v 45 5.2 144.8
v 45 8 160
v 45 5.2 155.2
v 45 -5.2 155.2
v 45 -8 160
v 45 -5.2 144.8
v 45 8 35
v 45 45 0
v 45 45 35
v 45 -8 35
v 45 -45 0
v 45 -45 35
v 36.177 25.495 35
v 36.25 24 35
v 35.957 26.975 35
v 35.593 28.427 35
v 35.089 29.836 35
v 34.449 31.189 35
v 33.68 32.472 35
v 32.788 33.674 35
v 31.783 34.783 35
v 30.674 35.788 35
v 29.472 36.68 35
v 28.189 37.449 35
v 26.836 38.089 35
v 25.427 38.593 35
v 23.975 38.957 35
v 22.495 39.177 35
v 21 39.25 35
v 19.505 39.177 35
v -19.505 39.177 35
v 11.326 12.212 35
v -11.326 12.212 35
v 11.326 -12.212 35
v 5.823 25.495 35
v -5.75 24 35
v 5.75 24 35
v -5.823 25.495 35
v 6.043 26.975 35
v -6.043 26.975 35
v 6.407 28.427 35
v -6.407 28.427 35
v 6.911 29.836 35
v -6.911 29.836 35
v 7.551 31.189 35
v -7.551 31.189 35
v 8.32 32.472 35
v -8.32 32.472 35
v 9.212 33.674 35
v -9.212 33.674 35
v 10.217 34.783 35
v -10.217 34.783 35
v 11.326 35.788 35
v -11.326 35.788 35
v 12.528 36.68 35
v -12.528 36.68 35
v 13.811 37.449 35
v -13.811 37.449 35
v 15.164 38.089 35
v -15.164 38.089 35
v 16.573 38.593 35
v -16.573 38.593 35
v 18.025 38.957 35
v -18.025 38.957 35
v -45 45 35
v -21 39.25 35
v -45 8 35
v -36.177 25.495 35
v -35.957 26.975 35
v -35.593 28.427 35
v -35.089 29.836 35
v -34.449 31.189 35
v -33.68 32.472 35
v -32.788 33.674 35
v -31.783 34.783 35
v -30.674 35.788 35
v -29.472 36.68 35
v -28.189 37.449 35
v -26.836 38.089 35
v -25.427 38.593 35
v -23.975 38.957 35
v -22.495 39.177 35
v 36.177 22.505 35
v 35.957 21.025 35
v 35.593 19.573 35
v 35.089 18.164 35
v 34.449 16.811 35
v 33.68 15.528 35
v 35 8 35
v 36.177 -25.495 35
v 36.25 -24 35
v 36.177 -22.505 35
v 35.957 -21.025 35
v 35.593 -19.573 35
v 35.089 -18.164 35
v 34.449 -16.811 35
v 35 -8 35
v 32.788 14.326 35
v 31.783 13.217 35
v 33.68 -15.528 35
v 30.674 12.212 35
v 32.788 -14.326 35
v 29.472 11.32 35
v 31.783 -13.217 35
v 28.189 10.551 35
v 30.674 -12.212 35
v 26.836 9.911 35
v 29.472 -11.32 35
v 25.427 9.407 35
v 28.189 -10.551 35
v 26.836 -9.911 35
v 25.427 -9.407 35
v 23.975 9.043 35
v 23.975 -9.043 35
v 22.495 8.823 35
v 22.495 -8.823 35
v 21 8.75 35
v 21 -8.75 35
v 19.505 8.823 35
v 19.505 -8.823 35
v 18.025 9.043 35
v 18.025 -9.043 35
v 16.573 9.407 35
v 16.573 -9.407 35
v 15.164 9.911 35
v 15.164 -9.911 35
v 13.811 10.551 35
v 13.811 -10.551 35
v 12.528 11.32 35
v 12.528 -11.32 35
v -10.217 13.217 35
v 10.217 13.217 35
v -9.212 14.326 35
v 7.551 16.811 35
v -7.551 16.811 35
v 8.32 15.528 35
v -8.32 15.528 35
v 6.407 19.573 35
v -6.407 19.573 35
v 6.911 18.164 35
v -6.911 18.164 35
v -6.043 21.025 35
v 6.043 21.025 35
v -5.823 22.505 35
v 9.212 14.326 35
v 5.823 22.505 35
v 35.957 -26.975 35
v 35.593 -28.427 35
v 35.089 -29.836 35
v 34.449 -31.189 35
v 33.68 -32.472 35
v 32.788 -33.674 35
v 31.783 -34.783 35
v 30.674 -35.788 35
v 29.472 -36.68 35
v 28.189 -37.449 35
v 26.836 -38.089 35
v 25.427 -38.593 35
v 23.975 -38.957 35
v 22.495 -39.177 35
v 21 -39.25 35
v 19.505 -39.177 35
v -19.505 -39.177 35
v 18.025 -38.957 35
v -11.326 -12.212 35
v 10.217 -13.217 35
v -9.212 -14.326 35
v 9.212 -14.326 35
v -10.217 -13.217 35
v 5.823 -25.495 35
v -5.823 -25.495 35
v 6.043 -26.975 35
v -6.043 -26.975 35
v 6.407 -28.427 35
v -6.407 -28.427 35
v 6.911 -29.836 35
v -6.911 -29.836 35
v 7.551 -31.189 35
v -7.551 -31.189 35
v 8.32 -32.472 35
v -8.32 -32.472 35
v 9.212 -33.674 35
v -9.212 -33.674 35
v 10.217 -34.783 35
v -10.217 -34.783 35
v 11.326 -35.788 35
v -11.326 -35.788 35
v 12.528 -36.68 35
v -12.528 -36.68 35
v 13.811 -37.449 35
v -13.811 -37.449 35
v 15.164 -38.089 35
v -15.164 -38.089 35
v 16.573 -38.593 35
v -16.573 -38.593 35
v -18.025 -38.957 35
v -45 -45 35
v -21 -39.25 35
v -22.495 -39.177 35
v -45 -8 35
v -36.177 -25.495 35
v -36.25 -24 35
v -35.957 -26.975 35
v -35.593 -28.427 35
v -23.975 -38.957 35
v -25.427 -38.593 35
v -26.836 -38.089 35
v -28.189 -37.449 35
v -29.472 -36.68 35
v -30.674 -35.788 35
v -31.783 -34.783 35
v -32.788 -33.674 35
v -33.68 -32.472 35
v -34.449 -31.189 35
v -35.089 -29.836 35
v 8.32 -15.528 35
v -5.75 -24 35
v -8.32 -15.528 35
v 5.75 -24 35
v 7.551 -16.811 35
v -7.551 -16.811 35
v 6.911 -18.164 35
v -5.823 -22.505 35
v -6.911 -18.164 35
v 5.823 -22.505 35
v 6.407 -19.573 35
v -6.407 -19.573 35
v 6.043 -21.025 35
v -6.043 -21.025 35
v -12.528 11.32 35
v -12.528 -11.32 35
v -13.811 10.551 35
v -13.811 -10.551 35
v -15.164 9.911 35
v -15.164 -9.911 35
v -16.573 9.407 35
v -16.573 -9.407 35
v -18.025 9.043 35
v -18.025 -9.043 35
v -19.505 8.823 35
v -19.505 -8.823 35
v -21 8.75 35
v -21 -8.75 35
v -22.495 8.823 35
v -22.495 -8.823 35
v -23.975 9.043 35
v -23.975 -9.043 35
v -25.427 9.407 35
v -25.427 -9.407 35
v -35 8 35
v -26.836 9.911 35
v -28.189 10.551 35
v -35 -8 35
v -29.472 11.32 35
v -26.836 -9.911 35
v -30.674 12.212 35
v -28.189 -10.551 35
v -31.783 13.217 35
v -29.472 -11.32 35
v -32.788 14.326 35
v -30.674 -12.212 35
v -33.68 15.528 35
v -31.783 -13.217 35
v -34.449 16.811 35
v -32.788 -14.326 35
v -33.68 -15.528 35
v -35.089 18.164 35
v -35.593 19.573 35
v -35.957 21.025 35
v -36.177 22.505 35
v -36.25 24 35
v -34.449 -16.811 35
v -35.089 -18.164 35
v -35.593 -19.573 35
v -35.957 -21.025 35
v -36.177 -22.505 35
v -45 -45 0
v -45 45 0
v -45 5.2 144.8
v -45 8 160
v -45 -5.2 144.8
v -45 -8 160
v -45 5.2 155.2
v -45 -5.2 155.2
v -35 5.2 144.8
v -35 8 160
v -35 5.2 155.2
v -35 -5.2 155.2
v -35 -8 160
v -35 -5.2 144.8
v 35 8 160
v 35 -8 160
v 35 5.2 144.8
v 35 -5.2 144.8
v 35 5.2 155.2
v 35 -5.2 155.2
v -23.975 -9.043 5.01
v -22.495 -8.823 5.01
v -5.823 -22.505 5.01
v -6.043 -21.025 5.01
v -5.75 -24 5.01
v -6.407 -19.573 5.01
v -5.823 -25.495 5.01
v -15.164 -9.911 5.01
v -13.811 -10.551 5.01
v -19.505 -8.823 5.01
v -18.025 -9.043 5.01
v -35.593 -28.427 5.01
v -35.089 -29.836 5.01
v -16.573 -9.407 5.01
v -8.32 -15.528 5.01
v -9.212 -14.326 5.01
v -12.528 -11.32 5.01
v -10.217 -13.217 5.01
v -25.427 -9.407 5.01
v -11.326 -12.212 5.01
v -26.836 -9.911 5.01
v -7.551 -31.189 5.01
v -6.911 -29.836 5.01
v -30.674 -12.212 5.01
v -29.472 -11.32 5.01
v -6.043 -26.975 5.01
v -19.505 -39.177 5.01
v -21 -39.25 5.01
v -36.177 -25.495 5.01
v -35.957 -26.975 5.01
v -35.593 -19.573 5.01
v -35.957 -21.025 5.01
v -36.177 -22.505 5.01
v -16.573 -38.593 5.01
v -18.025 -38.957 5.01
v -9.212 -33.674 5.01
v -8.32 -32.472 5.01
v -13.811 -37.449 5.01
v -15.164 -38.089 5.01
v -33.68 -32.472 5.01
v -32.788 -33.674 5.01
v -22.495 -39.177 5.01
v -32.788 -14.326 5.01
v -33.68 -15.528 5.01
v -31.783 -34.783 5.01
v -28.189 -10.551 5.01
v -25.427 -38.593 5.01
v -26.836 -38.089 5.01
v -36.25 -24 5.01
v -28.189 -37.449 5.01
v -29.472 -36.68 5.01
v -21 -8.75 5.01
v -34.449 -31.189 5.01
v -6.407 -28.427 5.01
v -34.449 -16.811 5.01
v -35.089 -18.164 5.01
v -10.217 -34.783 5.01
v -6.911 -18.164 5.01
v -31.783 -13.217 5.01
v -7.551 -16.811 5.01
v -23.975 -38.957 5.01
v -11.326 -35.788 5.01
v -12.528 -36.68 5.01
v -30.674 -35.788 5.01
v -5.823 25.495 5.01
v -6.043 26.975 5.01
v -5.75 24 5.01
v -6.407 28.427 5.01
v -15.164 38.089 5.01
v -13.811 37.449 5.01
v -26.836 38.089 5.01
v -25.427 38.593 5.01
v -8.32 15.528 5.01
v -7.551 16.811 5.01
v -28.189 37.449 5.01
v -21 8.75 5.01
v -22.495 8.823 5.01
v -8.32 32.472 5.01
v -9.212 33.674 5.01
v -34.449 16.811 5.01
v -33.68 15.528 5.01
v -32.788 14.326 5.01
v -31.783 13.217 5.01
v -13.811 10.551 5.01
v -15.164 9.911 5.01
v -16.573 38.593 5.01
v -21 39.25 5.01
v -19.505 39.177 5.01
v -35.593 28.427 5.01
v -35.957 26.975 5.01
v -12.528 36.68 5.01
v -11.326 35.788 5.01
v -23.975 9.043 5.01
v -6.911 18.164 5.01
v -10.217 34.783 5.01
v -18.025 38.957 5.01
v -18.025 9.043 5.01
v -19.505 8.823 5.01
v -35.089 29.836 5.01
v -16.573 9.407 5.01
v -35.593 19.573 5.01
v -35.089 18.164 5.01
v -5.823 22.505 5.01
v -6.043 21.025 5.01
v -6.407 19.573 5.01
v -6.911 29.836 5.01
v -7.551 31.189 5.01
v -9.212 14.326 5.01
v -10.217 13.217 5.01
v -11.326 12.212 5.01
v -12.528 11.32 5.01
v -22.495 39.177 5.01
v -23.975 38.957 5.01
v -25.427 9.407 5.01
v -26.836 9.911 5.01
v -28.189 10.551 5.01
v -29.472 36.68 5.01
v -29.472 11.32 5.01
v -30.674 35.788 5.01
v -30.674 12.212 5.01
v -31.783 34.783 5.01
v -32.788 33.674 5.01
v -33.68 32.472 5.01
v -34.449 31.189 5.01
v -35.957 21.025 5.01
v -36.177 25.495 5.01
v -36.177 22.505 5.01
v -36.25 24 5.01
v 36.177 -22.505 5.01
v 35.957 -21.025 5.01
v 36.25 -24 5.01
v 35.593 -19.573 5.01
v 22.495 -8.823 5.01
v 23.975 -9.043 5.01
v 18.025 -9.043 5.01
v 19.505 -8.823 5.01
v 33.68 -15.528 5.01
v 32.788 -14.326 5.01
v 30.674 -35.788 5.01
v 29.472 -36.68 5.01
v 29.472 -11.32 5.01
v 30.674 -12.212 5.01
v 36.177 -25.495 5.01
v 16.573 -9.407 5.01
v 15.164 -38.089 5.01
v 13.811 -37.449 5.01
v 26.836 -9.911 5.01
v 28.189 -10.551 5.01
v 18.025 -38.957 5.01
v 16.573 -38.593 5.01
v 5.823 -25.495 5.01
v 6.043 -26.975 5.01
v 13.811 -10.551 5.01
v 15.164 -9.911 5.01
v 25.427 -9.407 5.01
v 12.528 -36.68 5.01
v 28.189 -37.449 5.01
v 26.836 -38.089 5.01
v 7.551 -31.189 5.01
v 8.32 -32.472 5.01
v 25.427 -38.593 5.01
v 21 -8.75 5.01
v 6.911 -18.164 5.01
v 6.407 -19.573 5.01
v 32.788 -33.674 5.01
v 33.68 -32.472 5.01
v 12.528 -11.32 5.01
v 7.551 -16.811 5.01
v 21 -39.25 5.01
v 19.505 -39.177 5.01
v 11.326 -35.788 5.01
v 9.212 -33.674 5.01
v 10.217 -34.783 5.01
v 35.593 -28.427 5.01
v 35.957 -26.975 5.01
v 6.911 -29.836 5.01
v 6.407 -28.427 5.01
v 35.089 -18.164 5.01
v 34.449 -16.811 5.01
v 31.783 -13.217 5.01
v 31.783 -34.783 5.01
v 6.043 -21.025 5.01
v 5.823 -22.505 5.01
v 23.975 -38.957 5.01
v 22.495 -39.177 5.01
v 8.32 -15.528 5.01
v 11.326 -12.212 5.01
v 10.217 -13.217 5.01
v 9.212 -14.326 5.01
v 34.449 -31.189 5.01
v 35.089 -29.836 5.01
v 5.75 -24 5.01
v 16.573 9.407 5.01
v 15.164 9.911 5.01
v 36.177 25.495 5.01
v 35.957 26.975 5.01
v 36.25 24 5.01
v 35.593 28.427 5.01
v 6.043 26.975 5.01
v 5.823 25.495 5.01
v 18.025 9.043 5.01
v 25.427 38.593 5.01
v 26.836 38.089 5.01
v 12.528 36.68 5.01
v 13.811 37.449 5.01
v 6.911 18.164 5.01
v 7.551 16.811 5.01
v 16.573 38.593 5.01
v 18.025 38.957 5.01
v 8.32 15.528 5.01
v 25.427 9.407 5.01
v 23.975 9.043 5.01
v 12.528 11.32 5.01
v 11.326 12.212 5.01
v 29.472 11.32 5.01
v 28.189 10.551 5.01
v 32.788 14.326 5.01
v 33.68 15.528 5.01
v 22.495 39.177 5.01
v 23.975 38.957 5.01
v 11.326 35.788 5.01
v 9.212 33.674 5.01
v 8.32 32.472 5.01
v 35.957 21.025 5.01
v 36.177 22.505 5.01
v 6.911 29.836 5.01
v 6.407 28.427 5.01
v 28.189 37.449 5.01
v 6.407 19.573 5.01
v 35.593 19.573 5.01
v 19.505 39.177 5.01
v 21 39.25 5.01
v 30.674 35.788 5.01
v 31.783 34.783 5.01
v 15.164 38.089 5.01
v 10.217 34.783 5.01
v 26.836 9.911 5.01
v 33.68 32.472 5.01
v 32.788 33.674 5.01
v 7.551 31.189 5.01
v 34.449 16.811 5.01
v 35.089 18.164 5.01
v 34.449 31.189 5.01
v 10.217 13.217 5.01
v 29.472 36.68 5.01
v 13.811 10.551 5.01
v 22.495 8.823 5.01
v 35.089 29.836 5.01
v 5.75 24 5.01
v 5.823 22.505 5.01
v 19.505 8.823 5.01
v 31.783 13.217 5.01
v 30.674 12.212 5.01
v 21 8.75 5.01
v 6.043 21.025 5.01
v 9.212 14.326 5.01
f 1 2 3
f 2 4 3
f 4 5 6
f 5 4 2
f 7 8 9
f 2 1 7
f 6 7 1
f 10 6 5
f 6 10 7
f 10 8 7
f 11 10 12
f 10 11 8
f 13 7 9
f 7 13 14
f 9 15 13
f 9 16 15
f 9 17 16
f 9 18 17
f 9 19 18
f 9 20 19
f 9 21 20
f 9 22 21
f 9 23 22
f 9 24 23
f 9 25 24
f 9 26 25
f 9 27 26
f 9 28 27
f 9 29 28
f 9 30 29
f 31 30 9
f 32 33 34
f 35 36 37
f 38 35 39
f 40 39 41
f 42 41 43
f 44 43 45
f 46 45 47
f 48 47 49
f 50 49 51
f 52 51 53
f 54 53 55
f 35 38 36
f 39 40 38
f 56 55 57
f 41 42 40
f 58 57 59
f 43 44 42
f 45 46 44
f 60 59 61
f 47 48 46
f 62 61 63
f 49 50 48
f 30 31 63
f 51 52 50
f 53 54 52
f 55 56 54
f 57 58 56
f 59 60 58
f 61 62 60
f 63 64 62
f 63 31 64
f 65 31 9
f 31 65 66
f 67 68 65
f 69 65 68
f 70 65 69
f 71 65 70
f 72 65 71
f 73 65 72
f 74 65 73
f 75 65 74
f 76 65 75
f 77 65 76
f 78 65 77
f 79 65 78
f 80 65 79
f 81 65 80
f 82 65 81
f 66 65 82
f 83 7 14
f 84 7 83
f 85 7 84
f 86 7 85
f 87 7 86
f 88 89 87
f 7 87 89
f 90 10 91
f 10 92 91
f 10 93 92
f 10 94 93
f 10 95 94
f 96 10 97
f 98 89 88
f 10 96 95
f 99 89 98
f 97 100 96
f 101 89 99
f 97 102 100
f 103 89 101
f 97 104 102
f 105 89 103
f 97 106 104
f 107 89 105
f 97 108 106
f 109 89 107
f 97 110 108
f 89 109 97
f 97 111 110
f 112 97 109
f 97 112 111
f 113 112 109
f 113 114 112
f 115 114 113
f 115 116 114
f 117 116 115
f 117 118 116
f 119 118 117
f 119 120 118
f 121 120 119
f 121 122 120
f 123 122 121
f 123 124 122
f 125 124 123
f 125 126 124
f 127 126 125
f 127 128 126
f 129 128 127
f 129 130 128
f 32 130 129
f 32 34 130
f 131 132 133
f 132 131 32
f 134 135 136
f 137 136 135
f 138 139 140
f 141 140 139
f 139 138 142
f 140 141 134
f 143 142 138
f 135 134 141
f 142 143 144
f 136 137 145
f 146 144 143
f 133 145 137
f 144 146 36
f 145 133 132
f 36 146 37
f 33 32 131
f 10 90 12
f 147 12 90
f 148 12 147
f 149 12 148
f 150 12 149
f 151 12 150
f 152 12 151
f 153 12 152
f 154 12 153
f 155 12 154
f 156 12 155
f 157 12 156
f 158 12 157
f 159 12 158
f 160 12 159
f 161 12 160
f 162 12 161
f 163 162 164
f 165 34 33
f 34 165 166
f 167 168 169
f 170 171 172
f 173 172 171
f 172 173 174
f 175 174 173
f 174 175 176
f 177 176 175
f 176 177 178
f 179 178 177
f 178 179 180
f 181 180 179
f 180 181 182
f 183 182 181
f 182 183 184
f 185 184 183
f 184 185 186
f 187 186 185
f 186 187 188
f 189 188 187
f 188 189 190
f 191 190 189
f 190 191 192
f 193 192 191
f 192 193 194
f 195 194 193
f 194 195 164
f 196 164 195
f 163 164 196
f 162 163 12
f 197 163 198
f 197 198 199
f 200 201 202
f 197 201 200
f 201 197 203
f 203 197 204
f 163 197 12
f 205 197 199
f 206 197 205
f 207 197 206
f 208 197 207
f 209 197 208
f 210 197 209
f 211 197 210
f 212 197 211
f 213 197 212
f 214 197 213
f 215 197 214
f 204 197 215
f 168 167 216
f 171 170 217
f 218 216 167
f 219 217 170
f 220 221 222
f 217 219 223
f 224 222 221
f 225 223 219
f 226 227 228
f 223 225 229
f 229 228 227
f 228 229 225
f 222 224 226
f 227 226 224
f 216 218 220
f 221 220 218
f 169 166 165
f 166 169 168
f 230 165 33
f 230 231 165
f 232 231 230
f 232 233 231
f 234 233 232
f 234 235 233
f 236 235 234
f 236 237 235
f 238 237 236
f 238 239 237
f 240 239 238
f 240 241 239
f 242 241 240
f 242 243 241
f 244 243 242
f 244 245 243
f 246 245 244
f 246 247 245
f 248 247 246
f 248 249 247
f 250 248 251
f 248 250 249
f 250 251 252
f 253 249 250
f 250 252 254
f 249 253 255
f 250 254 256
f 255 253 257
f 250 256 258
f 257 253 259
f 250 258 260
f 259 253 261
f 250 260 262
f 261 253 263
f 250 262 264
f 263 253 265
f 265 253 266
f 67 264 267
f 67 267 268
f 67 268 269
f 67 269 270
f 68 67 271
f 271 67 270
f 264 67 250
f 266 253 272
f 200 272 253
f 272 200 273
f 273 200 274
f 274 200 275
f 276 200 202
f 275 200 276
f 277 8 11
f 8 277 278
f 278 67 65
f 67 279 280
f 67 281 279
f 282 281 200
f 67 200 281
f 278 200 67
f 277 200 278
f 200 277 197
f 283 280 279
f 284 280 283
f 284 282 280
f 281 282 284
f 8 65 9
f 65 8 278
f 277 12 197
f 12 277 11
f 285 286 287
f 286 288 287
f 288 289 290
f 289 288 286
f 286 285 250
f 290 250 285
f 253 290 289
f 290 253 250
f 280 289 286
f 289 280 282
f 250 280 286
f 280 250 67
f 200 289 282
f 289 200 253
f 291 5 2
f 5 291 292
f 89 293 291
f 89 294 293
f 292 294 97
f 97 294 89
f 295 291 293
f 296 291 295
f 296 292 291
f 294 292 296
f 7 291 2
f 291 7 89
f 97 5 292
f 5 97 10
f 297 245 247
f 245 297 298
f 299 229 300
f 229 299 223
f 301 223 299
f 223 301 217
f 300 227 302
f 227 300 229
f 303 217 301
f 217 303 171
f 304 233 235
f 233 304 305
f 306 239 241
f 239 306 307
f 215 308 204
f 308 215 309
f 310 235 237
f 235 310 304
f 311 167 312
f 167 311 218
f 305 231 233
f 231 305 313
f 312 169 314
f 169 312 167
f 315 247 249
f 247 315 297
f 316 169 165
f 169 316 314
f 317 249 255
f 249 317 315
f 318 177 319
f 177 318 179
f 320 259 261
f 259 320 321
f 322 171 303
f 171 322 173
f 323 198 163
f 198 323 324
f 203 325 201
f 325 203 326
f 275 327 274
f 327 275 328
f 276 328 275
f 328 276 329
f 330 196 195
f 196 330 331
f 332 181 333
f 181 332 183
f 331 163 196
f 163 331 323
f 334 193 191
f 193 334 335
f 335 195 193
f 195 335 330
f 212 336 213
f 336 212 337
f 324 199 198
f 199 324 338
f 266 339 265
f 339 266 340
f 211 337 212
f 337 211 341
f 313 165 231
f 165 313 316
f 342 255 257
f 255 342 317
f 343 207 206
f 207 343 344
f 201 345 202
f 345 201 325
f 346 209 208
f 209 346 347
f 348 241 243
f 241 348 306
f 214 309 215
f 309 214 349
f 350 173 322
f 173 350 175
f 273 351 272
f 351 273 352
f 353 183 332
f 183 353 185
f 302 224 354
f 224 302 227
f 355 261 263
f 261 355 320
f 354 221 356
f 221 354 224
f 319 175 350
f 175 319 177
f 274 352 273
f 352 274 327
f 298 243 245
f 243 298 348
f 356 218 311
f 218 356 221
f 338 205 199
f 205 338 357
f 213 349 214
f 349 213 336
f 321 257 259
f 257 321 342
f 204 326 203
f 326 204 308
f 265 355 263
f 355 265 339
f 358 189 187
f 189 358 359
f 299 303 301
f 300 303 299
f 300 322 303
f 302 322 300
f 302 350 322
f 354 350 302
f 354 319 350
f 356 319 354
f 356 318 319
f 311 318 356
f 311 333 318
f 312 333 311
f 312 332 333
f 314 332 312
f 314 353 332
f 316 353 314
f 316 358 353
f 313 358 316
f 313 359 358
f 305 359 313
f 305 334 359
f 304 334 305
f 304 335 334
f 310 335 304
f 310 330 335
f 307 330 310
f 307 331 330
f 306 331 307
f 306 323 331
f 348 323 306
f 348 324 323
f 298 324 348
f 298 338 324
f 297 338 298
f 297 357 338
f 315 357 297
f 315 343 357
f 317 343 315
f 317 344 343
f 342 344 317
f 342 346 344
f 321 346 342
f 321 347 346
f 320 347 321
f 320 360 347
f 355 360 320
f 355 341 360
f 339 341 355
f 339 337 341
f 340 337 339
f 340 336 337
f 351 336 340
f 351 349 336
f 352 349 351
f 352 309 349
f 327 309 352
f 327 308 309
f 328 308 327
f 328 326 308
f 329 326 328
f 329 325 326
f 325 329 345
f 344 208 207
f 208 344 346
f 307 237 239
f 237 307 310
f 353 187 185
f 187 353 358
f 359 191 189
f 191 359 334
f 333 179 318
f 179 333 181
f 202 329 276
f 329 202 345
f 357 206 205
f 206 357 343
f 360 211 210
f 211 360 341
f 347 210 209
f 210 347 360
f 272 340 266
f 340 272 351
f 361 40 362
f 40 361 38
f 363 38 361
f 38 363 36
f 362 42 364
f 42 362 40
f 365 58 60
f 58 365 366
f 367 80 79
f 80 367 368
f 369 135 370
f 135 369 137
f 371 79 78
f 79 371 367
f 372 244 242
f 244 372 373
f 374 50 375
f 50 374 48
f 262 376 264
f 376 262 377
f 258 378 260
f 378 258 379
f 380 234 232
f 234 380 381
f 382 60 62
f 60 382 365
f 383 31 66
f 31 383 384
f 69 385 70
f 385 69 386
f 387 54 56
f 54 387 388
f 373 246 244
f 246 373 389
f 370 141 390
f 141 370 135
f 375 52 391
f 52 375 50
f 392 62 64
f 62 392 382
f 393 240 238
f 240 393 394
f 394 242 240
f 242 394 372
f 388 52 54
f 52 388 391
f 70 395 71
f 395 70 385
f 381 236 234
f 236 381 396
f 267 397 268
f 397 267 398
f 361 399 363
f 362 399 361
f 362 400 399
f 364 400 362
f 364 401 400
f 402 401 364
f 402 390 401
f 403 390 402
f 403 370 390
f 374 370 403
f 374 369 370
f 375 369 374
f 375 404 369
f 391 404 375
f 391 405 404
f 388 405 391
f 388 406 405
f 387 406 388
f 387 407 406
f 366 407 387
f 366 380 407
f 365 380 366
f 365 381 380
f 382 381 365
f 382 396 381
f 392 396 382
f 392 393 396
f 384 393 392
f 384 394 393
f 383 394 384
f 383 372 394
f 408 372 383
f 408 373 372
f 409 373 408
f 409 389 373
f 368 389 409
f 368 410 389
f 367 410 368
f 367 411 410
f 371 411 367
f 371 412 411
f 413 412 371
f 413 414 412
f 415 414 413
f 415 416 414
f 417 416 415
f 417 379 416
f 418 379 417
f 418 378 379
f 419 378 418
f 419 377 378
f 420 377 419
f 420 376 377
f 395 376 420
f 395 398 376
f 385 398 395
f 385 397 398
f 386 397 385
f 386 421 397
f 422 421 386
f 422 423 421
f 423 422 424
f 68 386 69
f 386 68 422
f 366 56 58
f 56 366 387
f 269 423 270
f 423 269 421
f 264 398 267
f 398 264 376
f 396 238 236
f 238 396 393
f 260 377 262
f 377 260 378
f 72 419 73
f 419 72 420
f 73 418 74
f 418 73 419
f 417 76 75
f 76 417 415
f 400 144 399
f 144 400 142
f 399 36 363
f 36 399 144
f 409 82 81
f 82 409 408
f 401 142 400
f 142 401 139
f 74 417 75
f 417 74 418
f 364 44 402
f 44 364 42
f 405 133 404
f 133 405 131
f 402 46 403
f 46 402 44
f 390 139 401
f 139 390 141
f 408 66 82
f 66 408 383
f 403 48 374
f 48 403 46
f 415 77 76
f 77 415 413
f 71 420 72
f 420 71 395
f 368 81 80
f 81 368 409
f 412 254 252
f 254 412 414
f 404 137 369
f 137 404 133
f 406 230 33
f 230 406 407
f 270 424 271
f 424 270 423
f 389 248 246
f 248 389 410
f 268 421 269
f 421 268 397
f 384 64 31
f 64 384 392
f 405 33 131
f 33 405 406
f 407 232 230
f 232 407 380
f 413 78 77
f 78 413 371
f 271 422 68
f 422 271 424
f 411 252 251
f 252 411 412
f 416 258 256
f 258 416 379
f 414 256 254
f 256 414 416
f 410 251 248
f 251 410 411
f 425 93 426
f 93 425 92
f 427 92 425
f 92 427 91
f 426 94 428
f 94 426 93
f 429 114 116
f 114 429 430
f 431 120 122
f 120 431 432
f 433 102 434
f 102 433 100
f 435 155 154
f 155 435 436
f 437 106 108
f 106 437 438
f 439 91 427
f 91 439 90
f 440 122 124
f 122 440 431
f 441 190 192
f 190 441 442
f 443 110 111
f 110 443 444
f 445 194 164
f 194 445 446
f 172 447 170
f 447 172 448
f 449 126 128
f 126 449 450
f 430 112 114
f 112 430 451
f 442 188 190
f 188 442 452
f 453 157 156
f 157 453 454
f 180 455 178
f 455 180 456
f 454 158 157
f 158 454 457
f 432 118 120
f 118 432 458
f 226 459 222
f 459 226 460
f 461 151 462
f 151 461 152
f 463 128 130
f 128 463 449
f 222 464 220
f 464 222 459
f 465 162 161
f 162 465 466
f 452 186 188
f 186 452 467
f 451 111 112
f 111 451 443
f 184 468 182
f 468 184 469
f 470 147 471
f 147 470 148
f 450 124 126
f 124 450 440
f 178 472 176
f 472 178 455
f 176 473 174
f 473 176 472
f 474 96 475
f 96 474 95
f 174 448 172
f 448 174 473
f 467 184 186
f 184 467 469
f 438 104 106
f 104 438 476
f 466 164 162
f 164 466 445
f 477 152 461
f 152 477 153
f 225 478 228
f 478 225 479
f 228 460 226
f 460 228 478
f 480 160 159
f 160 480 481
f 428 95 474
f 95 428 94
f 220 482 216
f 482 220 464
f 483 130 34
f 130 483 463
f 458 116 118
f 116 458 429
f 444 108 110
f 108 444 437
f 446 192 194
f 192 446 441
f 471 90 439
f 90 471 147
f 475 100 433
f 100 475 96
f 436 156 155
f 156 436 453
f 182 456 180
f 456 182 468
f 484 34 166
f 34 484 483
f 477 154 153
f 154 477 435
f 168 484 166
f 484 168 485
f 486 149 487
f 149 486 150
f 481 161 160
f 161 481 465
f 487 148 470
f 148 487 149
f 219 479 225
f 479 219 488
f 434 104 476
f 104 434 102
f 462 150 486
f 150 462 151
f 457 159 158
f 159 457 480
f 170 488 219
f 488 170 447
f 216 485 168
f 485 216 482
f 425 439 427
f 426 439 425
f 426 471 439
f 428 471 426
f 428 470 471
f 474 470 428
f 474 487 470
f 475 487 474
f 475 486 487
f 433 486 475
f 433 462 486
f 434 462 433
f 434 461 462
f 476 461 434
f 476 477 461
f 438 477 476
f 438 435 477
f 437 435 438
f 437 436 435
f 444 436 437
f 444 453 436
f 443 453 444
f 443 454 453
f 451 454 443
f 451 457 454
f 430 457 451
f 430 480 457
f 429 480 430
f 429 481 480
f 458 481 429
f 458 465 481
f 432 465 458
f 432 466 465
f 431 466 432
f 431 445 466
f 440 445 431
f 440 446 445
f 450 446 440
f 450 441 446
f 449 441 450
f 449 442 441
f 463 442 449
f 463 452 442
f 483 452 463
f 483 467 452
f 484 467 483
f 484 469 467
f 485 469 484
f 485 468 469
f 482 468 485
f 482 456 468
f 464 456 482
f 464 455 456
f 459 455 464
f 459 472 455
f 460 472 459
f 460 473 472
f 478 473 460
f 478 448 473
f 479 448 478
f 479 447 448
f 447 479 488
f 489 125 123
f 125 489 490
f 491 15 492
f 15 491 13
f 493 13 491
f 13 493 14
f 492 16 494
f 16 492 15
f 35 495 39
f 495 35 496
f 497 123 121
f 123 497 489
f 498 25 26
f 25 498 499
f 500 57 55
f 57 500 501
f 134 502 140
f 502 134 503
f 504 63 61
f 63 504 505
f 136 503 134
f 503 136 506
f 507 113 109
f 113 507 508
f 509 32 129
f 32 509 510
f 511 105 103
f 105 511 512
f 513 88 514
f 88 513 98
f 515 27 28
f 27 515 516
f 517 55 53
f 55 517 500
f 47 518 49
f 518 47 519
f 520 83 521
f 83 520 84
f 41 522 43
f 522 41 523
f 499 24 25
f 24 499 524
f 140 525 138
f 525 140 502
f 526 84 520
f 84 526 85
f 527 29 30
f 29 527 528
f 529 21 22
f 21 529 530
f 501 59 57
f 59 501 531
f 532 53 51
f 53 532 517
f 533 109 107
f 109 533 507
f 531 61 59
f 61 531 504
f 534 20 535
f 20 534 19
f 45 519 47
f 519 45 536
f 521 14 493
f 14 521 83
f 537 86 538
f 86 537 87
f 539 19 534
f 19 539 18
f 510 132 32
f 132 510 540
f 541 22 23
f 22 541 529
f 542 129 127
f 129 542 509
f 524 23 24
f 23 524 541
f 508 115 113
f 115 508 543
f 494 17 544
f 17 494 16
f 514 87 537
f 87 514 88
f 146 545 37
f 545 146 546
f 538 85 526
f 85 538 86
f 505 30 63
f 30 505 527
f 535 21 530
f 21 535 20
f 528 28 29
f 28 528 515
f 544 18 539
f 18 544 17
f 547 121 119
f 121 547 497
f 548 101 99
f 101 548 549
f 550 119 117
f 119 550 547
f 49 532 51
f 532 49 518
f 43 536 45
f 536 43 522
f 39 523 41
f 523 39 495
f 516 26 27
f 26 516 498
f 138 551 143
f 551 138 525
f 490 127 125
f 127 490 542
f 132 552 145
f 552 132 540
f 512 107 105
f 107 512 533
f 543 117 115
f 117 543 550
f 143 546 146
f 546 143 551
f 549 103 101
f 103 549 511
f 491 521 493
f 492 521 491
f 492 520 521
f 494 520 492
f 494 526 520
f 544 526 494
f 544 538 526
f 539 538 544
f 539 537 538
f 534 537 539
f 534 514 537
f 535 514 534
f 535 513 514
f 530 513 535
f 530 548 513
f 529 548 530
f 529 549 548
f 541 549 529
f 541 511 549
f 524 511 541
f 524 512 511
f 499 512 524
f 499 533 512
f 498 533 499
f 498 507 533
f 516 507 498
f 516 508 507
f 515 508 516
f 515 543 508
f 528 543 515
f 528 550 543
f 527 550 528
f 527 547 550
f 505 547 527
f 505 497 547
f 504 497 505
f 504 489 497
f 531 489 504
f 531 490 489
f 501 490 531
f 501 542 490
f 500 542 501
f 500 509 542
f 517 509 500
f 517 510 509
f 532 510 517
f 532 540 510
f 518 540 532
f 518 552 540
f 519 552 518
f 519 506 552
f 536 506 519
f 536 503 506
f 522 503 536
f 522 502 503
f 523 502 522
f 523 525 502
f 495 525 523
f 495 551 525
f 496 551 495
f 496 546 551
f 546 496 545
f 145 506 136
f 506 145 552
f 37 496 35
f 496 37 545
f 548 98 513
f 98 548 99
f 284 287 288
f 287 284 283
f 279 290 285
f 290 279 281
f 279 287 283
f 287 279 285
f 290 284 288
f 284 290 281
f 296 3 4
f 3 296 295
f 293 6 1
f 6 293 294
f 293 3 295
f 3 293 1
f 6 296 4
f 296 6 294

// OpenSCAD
// Part 1: Base block with tube seats and vertical posts
// Part 2: Handle bar to be slid through the posts

// --- Dimensions Part 1 ---
base_x      = 90;    // Base length (X)
base_y      = 90;    // Base width (Y)
base_z      = 35;    // Base height (Z)

seat_d      = 30.5;  // Diameter of tube seats
seat_depth  = 30;    // Depth of tube seats
seat_floor  = 5;     // Remaining floor thickness (35 - 30)

seat_x_pos  = 21;    // X offset for seats
seat_y_pos  = 24;    // Y offset for seats

post_x_thick = 10;   // Thickness of posts (X dimension)
post_y_wide  = 16;   // Width of posts (Y dimension)
post_z_high  = 160;  // Total height of posts

hole_sq_d    = 10.4; // Square hole dimension
hole_sq_z    = 150;  // Z height of the square hole center

// --- Dimensions Part 2 ---
handle_x     = 100;  // Length of handle (X)
handle_w     = 10;   // Width of handle (Y)
handle_h     = 10;   // Height of handle (Z)
handle_y_min  = 55;  // Y position start (55 to 65)
handle_y_max  = 65;

$fn = 64;

// --- Part 1: Base and Posts ---
module part_1() {
    difference() {
        union() {
            // Main Base Block
            translate([-base_x/2, -base_y/2, 0])
                cube([base_x, base_y, base_z]);
            
            // Post 1 (at -X end)
            translate([-base_x/2, -post_y_wide/2, base_z])
                cube([post_x_thick, post_y_wide, post_z_high - base_z]);
            
            // Post 2 (at +X end)
            translate([base_x/2 - post_x_thick, -post_y_wide/2, base_z])
                cube([post_x_thick, post_y_wide, post_z_high - base_z]);
        }

        // Tube Seats (Blind holes)
        // Seats are centered at x = +/- 21, y = +/- 24
        // We use a loop to define the 4 positions
        for (sx = [-seat_x_pos, seat_x_pos]) {
            for (sy = [-seat_y_pos, seat_y_pos]) {
                translate([sx, sy, base_z - seat_depth + 0.01])
                    cylinder(h = seat_depth, d = seat_d);
            }
        }

        // Square holes through posts
        // Centered at z = 150. 
        // Since posts start at z = 35, the local z relative to post bottom is 150 - 35 = 115.
        // We cut through the whole X range of the posts.
        // Post 1 is at X: [-45, -35], Post 2 is at X: [35, 45]
        // To ensure clean cut, we use a large cube for the hole.
        
        // Hole 1 (Left Post)
        translate([-base_x/2 - 1, -hole_sq_d/2, 150 - hole_sq_d/2])
            cube([post_x_thick + 2, hole_sq_d, hole_sq_d]);
            
        // Hole 2 (Right Post)
        translate([base_x/2 - post_x_thick - 1, -hole_sq_d/2, 150 - hole_sq_d/2])
            cube([post_x_thick + 2, hole_sq_d, hole_sq_d]);
    }
}

// --- Part 2: Handle ---
module part_2() {
    // The handle is a 10x10x100 bar.
    // It is centered on X (0), and spans Y from 55 to 65.
    // It lies on the bed (Z=0).
    translate([-handle_x/2, handle_y_min, 0])
        cube([handle_x, handle_w, handle_h]);
}

// --- Rendering ---
// To view Part 1:
part_1();

// To view Part 2 (uncomment below and comment part_1 above to see separately):
// translate([0, 100, 0]) part_2(); 

// To view both together for assembly visualization:
// translate([0, 0, 0]) part_1();
// translate([0, 100, 0]) part_2(); // Offset Y so they don't overlap in preview
